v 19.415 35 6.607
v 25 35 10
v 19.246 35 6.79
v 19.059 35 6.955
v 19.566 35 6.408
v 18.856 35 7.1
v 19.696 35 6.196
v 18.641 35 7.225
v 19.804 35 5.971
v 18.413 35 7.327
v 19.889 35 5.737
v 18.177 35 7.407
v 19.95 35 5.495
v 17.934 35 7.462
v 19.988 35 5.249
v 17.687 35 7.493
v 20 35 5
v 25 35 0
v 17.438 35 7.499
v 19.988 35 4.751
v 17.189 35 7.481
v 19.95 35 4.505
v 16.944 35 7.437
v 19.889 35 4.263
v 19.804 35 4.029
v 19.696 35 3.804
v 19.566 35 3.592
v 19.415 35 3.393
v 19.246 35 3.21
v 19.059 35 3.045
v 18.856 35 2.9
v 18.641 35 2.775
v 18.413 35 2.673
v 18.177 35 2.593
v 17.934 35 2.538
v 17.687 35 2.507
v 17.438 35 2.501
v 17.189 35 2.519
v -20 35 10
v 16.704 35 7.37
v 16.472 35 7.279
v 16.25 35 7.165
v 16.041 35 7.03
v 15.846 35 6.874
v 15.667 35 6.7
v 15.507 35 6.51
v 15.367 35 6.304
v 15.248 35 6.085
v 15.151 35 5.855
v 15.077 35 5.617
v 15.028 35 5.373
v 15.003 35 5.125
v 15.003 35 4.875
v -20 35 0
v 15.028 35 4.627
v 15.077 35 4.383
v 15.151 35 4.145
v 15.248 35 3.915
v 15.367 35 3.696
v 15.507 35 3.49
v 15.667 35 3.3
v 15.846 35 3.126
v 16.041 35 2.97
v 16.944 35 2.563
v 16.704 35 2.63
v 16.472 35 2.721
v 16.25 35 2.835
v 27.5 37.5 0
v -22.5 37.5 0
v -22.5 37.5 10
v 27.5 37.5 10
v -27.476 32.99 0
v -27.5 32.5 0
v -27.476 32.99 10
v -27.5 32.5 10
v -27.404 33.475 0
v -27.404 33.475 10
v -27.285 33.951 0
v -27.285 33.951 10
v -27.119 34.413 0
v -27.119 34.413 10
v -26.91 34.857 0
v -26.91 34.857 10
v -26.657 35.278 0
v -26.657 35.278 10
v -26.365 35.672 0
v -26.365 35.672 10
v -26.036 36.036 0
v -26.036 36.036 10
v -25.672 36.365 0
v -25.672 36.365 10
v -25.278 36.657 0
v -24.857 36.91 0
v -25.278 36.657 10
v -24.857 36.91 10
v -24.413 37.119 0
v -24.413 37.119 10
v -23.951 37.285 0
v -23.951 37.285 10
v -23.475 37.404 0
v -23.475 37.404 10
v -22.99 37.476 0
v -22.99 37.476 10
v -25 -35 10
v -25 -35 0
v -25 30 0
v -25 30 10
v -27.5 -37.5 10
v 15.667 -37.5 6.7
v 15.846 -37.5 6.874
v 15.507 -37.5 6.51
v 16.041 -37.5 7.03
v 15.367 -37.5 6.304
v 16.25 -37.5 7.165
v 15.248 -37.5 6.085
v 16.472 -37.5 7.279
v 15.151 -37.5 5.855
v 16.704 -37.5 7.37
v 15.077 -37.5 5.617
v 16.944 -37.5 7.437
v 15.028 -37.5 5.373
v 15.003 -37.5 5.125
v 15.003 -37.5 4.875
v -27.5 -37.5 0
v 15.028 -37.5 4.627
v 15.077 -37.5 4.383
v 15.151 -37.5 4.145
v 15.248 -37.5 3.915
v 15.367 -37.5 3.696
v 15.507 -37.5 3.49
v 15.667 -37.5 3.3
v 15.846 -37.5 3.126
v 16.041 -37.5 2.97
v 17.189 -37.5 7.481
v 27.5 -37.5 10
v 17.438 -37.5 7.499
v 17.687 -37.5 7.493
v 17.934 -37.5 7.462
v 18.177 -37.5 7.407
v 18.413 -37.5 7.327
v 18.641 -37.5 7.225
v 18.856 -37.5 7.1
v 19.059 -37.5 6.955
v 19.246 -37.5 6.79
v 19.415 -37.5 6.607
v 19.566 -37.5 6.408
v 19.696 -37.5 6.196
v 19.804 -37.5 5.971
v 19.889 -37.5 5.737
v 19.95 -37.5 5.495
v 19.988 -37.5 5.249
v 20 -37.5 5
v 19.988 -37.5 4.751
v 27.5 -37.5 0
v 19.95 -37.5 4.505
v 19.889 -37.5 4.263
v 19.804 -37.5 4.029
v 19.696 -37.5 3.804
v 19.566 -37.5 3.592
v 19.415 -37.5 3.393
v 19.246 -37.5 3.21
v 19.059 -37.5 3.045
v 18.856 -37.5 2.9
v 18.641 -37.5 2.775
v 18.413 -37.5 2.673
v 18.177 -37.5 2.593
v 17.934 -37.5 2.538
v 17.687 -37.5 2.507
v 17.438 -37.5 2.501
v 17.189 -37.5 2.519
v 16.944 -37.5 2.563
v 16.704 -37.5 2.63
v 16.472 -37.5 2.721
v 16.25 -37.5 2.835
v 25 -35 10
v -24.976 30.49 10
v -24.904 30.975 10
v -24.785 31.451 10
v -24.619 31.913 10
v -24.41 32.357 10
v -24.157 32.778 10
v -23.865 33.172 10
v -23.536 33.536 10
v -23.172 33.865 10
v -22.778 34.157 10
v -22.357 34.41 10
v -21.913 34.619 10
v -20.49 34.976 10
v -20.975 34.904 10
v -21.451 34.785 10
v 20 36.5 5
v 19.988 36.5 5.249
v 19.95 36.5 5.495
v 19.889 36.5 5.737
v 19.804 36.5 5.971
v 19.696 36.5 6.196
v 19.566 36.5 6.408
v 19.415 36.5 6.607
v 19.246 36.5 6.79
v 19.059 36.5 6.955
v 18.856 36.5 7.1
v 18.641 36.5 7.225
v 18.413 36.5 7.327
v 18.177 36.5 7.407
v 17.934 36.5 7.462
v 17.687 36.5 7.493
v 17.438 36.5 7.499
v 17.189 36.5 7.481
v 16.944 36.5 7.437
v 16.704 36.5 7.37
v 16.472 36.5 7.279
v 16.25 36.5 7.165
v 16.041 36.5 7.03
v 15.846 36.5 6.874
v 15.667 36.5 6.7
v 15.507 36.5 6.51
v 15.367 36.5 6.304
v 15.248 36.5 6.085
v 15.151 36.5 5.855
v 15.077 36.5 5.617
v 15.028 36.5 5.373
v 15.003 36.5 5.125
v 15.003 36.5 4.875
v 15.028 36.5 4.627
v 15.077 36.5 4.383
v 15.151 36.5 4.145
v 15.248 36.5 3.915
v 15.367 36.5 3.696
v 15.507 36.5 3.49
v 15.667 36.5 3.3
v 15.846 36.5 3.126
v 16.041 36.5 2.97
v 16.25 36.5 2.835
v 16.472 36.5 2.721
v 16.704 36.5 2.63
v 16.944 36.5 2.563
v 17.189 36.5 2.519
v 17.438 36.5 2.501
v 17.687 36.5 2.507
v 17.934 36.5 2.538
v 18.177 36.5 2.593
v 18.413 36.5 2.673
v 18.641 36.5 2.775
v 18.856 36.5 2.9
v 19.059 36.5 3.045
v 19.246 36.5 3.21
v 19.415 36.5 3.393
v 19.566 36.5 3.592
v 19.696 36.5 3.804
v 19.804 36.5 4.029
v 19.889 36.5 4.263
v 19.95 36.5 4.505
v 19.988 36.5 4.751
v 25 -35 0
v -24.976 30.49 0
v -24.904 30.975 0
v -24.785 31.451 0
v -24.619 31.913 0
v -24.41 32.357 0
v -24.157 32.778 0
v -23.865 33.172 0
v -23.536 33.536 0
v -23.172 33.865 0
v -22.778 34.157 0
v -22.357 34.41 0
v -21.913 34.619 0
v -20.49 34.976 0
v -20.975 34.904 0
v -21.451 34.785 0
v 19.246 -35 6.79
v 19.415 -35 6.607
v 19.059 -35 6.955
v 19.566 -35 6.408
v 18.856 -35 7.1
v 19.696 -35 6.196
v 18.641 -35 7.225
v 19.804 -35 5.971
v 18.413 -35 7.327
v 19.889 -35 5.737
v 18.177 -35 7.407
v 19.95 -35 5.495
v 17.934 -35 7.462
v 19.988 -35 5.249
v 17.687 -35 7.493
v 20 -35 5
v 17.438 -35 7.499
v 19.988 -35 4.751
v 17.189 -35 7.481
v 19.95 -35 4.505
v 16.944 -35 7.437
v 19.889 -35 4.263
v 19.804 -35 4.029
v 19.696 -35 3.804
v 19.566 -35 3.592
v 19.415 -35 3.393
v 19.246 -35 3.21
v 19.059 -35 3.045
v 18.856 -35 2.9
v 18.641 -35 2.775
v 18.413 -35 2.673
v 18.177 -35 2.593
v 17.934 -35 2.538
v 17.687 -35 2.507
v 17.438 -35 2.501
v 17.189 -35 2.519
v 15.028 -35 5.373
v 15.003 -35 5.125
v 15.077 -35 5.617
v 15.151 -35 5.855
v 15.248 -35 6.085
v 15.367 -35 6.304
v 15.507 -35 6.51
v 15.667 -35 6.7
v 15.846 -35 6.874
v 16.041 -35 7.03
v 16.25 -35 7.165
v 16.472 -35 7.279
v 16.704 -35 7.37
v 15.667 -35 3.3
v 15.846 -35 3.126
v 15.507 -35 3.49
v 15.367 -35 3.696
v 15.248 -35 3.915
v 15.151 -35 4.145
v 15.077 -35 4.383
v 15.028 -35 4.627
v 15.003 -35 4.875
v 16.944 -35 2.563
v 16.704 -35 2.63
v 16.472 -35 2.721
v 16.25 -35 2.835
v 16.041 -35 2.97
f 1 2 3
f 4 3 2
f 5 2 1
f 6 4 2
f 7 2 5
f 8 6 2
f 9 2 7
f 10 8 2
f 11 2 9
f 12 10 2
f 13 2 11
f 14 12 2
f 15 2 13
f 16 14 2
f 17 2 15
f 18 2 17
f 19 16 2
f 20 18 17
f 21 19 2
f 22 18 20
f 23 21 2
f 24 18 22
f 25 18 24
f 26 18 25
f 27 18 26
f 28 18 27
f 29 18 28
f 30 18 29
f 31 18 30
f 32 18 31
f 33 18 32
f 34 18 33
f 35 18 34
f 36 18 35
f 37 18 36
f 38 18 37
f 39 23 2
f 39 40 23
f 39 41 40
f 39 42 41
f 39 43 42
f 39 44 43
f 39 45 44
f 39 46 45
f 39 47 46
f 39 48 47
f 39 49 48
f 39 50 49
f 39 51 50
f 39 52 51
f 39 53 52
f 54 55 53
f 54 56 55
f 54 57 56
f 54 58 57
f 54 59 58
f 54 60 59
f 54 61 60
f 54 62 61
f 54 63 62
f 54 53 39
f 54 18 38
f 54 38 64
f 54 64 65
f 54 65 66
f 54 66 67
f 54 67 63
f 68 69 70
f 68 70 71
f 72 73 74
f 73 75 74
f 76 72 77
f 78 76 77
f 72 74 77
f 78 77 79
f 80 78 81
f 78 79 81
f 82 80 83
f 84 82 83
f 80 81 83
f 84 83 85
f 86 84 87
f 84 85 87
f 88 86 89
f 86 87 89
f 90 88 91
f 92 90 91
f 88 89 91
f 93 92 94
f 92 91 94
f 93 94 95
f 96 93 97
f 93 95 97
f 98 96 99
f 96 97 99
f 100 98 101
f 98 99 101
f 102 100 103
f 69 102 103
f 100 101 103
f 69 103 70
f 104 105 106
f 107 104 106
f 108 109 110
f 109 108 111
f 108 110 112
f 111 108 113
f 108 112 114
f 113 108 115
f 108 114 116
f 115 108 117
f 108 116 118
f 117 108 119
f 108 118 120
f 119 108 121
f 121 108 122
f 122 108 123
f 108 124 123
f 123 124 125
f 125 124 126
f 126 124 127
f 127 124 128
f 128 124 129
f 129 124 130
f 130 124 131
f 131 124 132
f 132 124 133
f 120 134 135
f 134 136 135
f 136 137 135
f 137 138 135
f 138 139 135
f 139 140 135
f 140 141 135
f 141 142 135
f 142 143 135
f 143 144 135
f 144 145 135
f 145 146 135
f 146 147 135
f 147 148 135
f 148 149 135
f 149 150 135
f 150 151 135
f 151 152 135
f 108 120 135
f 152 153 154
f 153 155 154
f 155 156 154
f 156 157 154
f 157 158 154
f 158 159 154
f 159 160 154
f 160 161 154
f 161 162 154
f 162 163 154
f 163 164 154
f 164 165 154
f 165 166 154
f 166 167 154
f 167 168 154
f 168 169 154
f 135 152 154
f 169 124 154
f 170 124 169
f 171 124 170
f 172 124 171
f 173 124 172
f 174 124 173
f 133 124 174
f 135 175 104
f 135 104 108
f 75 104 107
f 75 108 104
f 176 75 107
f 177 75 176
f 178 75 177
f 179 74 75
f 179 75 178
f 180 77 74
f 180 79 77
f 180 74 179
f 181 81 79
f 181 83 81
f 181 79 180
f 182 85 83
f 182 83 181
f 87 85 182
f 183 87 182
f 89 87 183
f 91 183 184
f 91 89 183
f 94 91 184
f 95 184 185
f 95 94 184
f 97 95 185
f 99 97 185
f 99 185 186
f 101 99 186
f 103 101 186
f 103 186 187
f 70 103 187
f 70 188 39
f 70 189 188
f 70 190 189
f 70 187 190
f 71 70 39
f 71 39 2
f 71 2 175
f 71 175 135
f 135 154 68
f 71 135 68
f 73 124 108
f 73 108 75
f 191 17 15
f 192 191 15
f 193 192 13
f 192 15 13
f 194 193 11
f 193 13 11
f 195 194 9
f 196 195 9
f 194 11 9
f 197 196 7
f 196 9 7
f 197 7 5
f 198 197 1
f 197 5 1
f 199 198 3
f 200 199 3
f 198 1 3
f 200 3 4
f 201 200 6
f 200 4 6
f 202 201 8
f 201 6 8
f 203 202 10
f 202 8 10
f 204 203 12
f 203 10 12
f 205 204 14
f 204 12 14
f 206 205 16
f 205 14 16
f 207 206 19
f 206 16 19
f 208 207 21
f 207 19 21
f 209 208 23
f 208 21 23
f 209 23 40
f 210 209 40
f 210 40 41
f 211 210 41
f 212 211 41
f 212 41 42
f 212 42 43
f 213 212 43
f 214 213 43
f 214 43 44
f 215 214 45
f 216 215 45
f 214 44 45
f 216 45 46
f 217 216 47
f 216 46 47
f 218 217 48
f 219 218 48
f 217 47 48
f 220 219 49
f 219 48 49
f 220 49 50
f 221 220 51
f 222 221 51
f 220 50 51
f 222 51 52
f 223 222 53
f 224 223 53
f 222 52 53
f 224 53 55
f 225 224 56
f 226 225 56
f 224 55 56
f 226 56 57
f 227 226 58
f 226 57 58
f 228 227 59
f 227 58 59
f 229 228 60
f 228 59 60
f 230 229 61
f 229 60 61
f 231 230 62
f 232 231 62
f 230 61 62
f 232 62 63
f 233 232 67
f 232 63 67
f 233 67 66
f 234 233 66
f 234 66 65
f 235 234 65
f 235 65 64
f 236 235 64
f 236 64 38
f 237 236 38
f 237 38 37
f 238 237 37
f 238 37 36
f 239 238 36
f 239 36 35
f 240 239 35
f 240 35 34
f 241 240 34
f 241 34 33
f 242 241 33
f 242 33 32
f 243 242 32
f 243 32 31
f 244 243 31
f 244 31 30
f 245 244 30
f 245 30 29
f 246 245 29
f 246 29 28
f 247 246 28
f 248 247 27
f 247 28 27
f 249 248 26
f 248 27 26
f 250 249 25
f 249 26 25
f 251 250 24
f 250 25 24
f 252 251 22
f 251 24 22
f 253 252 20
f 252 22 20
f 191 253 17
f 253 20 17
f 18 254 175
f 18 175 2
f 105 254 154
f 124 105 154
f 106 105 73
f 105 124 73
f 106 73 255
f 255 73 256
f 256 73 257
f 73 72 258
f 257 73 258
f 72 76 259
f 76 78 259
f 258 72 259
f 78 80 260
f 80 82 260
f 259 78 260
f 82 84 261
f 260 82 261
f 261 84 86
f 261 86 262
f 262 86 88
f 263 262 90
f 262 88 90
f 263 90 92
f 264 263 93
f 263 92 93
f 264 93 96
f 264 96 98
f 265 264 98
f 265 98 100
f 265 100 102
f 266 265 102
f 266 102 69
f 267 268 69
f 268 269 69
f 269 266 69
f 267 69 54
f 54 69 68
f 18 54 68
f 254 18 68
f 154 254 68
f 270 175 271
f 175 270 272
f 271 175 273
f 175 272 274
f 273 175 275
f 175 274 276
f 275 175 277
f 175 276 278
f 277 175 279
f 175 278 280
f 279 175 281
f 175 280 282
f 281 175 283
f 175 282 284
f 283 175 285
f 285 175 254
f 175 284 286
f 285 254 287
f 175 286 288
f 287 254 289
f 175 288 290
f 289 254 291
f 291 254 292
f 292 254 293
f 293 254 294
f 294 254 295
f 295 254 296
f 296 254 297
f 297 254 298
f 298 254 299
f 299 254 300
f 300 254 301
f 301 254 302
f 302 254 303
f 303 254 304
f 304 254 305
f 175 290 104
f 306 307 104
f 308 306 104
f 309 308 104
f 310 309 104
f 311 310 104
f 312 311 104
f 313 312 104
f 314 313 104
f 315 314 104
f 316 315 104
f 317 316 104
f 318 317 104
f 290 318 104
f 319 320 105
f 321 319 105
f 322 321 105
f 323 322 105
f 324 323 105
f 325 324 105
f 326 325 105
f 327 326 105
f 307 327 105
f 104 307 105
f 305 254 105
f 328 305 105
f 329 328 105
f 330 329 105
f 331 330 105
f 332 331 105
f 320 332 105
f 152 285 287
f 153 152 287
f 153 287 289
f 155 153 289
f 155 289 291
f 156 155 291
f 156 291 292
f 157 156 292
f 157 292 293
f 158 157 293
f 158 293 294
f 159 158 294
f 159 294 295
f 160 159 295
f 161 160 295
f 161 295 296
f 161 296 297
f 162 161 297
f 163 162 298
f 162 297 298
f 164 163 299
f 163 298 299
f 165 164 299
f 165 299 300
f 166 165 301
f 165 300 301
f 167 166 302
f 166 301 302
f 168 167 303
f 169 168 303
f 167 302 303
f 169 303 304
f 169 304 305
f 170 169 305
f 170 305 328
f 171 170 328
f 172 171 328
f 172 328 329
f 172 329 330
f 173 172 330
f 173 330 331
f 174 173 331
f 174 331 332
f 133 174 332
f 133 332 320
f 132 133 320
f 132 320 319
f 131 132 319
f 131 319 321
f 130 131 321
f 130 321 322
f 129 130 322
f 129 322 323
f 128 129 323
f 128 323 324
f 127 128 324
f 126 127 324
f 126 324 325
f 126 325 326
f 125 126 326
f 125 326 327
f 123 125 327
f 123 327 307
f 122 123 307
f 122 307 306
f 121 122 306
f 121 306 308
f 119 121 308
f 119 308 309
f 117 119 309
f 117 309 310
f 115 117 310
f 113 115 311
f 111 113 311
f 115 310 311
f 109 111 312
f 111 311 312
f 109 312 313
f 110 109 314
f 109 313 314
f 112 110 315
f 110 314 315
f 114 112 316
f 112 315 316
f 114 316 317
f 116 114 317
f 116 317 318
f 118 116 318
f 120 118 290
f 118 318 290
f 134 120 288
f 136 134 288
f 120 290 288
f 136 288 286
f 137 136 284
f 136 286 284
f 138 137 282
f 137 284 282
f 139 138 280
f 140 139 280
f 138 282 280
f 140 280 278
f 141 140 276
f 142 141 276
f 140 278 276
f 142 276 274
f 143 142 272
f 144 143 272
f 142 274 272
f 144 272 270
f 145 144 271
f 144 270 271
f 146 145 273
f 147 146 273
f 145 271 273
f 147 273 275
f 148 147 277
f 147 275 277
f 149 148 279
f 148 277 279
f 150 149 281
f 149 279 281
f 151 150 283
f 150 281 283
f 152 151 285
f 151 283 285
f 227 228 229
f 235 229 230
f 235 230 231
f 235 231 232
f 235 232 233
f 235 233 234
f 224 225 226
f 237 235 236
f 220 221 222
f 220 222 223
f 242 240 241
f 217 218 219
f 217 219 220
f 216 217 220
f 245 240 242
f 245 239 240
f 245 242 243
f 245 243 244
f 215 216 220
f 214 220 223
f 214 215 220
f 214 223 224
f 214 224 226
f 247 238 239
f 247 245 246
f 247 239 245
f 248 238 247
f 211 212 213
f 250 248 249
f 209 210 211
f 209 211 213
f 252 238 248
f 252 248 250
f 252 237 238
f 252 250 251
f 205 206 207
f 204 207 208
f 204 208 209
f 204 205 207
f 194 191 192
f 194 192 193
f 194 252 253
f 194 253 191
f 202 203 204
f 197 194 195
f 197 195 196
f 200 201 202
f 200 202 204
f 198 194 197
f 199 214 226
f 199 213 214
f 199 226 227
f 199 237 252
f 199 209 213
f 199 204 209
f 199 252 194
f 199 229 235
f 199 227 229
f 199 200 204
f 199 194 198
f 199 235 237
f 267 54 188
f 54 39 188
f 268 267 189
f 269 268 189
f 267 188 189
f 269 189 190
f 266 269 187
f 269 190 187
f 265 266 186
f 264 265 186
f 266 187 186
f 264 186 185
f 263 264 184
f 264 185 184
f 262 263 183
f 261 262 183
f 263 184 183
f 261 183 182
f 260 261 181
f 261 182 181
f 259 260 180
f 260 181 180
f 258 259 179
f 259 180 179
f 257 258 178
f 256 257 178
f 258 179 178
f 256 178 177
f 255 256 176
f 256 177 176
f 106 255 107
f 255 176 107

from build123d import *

# Parameters (mm, degrees)
SKETCH_1_W          = 55
SKETCH_1_H          = 75
EXTRUDE_1_DEPTH     = 10
SKETCH_3_W          = 50
SKETCH_3_H          = 70
CUT_EXTRUDE_1_DEPTH = 48.565743976
FILLET_2_R          = 5
SKETCH_4_R          = 2.5
CUT_EXTRUDE_2_DEPTH = 1.5
SKETCH_5_R          = 2.5
CUT_EXTRUDE_3_DEPTH = 79.182478856


with BuildPart() as part:
    # 草图1 → 凸台-拉伸1 (new body)
    with BuildSketch(Plane.XY):
        Rectangle(SKETCH_1_W, SKETCH_1_H)
    extrude(amount=EXTRUDE_1_DEPTH)

    # 草图3 → 切除-拉伸1 (cut, through all)
    with BuildSketch(Plane(origin=(0, 0, 0), x_dir=(-1, 0, 0), z_dir=(0, 0, -1))):
        Rectangle(SKETCH_3_W, SKETCH_3_H)
    extrude(amount=-CUT_EXTRUDE_1_DEPTH, mode=Mode.SUBTRACT)

    # 圆角2
    fillet_2_edges = [part.edges().sort_by_distance(p)[0] for p in [
        (-25, 35, 5),
        (-27.5, 37.5, 5),
    ]]
    fillet(fillet_2_edges, radius=FILLET_2_R)

    # 草图4 → 切除-拉伸2 (cut)
    with BuildSketch(Plane.XZ.offset(-35)):
        with Locations((17.5, 5)):
            Circle(SKETCH_4_R)
    extrude(amount=-CUT_EXTRUDE_2_DEPTH, mode=Mode.SUBTRACT)

    # 草图5 → 切除-拉伸3 (cut, through all)
    with BuildSketch(Plane(origin=(0, -35, 0), x_dir=(1, 0, 0), z_dir=(0, 1, 0))):
        with Locations((17.5, -5)):
            Circle(SKETCH_5_R)
    extrude(amount=-CUT_EXTRUDE_3_DEPTH, mode=Mode.SUBTRACT)


solid = part.part
